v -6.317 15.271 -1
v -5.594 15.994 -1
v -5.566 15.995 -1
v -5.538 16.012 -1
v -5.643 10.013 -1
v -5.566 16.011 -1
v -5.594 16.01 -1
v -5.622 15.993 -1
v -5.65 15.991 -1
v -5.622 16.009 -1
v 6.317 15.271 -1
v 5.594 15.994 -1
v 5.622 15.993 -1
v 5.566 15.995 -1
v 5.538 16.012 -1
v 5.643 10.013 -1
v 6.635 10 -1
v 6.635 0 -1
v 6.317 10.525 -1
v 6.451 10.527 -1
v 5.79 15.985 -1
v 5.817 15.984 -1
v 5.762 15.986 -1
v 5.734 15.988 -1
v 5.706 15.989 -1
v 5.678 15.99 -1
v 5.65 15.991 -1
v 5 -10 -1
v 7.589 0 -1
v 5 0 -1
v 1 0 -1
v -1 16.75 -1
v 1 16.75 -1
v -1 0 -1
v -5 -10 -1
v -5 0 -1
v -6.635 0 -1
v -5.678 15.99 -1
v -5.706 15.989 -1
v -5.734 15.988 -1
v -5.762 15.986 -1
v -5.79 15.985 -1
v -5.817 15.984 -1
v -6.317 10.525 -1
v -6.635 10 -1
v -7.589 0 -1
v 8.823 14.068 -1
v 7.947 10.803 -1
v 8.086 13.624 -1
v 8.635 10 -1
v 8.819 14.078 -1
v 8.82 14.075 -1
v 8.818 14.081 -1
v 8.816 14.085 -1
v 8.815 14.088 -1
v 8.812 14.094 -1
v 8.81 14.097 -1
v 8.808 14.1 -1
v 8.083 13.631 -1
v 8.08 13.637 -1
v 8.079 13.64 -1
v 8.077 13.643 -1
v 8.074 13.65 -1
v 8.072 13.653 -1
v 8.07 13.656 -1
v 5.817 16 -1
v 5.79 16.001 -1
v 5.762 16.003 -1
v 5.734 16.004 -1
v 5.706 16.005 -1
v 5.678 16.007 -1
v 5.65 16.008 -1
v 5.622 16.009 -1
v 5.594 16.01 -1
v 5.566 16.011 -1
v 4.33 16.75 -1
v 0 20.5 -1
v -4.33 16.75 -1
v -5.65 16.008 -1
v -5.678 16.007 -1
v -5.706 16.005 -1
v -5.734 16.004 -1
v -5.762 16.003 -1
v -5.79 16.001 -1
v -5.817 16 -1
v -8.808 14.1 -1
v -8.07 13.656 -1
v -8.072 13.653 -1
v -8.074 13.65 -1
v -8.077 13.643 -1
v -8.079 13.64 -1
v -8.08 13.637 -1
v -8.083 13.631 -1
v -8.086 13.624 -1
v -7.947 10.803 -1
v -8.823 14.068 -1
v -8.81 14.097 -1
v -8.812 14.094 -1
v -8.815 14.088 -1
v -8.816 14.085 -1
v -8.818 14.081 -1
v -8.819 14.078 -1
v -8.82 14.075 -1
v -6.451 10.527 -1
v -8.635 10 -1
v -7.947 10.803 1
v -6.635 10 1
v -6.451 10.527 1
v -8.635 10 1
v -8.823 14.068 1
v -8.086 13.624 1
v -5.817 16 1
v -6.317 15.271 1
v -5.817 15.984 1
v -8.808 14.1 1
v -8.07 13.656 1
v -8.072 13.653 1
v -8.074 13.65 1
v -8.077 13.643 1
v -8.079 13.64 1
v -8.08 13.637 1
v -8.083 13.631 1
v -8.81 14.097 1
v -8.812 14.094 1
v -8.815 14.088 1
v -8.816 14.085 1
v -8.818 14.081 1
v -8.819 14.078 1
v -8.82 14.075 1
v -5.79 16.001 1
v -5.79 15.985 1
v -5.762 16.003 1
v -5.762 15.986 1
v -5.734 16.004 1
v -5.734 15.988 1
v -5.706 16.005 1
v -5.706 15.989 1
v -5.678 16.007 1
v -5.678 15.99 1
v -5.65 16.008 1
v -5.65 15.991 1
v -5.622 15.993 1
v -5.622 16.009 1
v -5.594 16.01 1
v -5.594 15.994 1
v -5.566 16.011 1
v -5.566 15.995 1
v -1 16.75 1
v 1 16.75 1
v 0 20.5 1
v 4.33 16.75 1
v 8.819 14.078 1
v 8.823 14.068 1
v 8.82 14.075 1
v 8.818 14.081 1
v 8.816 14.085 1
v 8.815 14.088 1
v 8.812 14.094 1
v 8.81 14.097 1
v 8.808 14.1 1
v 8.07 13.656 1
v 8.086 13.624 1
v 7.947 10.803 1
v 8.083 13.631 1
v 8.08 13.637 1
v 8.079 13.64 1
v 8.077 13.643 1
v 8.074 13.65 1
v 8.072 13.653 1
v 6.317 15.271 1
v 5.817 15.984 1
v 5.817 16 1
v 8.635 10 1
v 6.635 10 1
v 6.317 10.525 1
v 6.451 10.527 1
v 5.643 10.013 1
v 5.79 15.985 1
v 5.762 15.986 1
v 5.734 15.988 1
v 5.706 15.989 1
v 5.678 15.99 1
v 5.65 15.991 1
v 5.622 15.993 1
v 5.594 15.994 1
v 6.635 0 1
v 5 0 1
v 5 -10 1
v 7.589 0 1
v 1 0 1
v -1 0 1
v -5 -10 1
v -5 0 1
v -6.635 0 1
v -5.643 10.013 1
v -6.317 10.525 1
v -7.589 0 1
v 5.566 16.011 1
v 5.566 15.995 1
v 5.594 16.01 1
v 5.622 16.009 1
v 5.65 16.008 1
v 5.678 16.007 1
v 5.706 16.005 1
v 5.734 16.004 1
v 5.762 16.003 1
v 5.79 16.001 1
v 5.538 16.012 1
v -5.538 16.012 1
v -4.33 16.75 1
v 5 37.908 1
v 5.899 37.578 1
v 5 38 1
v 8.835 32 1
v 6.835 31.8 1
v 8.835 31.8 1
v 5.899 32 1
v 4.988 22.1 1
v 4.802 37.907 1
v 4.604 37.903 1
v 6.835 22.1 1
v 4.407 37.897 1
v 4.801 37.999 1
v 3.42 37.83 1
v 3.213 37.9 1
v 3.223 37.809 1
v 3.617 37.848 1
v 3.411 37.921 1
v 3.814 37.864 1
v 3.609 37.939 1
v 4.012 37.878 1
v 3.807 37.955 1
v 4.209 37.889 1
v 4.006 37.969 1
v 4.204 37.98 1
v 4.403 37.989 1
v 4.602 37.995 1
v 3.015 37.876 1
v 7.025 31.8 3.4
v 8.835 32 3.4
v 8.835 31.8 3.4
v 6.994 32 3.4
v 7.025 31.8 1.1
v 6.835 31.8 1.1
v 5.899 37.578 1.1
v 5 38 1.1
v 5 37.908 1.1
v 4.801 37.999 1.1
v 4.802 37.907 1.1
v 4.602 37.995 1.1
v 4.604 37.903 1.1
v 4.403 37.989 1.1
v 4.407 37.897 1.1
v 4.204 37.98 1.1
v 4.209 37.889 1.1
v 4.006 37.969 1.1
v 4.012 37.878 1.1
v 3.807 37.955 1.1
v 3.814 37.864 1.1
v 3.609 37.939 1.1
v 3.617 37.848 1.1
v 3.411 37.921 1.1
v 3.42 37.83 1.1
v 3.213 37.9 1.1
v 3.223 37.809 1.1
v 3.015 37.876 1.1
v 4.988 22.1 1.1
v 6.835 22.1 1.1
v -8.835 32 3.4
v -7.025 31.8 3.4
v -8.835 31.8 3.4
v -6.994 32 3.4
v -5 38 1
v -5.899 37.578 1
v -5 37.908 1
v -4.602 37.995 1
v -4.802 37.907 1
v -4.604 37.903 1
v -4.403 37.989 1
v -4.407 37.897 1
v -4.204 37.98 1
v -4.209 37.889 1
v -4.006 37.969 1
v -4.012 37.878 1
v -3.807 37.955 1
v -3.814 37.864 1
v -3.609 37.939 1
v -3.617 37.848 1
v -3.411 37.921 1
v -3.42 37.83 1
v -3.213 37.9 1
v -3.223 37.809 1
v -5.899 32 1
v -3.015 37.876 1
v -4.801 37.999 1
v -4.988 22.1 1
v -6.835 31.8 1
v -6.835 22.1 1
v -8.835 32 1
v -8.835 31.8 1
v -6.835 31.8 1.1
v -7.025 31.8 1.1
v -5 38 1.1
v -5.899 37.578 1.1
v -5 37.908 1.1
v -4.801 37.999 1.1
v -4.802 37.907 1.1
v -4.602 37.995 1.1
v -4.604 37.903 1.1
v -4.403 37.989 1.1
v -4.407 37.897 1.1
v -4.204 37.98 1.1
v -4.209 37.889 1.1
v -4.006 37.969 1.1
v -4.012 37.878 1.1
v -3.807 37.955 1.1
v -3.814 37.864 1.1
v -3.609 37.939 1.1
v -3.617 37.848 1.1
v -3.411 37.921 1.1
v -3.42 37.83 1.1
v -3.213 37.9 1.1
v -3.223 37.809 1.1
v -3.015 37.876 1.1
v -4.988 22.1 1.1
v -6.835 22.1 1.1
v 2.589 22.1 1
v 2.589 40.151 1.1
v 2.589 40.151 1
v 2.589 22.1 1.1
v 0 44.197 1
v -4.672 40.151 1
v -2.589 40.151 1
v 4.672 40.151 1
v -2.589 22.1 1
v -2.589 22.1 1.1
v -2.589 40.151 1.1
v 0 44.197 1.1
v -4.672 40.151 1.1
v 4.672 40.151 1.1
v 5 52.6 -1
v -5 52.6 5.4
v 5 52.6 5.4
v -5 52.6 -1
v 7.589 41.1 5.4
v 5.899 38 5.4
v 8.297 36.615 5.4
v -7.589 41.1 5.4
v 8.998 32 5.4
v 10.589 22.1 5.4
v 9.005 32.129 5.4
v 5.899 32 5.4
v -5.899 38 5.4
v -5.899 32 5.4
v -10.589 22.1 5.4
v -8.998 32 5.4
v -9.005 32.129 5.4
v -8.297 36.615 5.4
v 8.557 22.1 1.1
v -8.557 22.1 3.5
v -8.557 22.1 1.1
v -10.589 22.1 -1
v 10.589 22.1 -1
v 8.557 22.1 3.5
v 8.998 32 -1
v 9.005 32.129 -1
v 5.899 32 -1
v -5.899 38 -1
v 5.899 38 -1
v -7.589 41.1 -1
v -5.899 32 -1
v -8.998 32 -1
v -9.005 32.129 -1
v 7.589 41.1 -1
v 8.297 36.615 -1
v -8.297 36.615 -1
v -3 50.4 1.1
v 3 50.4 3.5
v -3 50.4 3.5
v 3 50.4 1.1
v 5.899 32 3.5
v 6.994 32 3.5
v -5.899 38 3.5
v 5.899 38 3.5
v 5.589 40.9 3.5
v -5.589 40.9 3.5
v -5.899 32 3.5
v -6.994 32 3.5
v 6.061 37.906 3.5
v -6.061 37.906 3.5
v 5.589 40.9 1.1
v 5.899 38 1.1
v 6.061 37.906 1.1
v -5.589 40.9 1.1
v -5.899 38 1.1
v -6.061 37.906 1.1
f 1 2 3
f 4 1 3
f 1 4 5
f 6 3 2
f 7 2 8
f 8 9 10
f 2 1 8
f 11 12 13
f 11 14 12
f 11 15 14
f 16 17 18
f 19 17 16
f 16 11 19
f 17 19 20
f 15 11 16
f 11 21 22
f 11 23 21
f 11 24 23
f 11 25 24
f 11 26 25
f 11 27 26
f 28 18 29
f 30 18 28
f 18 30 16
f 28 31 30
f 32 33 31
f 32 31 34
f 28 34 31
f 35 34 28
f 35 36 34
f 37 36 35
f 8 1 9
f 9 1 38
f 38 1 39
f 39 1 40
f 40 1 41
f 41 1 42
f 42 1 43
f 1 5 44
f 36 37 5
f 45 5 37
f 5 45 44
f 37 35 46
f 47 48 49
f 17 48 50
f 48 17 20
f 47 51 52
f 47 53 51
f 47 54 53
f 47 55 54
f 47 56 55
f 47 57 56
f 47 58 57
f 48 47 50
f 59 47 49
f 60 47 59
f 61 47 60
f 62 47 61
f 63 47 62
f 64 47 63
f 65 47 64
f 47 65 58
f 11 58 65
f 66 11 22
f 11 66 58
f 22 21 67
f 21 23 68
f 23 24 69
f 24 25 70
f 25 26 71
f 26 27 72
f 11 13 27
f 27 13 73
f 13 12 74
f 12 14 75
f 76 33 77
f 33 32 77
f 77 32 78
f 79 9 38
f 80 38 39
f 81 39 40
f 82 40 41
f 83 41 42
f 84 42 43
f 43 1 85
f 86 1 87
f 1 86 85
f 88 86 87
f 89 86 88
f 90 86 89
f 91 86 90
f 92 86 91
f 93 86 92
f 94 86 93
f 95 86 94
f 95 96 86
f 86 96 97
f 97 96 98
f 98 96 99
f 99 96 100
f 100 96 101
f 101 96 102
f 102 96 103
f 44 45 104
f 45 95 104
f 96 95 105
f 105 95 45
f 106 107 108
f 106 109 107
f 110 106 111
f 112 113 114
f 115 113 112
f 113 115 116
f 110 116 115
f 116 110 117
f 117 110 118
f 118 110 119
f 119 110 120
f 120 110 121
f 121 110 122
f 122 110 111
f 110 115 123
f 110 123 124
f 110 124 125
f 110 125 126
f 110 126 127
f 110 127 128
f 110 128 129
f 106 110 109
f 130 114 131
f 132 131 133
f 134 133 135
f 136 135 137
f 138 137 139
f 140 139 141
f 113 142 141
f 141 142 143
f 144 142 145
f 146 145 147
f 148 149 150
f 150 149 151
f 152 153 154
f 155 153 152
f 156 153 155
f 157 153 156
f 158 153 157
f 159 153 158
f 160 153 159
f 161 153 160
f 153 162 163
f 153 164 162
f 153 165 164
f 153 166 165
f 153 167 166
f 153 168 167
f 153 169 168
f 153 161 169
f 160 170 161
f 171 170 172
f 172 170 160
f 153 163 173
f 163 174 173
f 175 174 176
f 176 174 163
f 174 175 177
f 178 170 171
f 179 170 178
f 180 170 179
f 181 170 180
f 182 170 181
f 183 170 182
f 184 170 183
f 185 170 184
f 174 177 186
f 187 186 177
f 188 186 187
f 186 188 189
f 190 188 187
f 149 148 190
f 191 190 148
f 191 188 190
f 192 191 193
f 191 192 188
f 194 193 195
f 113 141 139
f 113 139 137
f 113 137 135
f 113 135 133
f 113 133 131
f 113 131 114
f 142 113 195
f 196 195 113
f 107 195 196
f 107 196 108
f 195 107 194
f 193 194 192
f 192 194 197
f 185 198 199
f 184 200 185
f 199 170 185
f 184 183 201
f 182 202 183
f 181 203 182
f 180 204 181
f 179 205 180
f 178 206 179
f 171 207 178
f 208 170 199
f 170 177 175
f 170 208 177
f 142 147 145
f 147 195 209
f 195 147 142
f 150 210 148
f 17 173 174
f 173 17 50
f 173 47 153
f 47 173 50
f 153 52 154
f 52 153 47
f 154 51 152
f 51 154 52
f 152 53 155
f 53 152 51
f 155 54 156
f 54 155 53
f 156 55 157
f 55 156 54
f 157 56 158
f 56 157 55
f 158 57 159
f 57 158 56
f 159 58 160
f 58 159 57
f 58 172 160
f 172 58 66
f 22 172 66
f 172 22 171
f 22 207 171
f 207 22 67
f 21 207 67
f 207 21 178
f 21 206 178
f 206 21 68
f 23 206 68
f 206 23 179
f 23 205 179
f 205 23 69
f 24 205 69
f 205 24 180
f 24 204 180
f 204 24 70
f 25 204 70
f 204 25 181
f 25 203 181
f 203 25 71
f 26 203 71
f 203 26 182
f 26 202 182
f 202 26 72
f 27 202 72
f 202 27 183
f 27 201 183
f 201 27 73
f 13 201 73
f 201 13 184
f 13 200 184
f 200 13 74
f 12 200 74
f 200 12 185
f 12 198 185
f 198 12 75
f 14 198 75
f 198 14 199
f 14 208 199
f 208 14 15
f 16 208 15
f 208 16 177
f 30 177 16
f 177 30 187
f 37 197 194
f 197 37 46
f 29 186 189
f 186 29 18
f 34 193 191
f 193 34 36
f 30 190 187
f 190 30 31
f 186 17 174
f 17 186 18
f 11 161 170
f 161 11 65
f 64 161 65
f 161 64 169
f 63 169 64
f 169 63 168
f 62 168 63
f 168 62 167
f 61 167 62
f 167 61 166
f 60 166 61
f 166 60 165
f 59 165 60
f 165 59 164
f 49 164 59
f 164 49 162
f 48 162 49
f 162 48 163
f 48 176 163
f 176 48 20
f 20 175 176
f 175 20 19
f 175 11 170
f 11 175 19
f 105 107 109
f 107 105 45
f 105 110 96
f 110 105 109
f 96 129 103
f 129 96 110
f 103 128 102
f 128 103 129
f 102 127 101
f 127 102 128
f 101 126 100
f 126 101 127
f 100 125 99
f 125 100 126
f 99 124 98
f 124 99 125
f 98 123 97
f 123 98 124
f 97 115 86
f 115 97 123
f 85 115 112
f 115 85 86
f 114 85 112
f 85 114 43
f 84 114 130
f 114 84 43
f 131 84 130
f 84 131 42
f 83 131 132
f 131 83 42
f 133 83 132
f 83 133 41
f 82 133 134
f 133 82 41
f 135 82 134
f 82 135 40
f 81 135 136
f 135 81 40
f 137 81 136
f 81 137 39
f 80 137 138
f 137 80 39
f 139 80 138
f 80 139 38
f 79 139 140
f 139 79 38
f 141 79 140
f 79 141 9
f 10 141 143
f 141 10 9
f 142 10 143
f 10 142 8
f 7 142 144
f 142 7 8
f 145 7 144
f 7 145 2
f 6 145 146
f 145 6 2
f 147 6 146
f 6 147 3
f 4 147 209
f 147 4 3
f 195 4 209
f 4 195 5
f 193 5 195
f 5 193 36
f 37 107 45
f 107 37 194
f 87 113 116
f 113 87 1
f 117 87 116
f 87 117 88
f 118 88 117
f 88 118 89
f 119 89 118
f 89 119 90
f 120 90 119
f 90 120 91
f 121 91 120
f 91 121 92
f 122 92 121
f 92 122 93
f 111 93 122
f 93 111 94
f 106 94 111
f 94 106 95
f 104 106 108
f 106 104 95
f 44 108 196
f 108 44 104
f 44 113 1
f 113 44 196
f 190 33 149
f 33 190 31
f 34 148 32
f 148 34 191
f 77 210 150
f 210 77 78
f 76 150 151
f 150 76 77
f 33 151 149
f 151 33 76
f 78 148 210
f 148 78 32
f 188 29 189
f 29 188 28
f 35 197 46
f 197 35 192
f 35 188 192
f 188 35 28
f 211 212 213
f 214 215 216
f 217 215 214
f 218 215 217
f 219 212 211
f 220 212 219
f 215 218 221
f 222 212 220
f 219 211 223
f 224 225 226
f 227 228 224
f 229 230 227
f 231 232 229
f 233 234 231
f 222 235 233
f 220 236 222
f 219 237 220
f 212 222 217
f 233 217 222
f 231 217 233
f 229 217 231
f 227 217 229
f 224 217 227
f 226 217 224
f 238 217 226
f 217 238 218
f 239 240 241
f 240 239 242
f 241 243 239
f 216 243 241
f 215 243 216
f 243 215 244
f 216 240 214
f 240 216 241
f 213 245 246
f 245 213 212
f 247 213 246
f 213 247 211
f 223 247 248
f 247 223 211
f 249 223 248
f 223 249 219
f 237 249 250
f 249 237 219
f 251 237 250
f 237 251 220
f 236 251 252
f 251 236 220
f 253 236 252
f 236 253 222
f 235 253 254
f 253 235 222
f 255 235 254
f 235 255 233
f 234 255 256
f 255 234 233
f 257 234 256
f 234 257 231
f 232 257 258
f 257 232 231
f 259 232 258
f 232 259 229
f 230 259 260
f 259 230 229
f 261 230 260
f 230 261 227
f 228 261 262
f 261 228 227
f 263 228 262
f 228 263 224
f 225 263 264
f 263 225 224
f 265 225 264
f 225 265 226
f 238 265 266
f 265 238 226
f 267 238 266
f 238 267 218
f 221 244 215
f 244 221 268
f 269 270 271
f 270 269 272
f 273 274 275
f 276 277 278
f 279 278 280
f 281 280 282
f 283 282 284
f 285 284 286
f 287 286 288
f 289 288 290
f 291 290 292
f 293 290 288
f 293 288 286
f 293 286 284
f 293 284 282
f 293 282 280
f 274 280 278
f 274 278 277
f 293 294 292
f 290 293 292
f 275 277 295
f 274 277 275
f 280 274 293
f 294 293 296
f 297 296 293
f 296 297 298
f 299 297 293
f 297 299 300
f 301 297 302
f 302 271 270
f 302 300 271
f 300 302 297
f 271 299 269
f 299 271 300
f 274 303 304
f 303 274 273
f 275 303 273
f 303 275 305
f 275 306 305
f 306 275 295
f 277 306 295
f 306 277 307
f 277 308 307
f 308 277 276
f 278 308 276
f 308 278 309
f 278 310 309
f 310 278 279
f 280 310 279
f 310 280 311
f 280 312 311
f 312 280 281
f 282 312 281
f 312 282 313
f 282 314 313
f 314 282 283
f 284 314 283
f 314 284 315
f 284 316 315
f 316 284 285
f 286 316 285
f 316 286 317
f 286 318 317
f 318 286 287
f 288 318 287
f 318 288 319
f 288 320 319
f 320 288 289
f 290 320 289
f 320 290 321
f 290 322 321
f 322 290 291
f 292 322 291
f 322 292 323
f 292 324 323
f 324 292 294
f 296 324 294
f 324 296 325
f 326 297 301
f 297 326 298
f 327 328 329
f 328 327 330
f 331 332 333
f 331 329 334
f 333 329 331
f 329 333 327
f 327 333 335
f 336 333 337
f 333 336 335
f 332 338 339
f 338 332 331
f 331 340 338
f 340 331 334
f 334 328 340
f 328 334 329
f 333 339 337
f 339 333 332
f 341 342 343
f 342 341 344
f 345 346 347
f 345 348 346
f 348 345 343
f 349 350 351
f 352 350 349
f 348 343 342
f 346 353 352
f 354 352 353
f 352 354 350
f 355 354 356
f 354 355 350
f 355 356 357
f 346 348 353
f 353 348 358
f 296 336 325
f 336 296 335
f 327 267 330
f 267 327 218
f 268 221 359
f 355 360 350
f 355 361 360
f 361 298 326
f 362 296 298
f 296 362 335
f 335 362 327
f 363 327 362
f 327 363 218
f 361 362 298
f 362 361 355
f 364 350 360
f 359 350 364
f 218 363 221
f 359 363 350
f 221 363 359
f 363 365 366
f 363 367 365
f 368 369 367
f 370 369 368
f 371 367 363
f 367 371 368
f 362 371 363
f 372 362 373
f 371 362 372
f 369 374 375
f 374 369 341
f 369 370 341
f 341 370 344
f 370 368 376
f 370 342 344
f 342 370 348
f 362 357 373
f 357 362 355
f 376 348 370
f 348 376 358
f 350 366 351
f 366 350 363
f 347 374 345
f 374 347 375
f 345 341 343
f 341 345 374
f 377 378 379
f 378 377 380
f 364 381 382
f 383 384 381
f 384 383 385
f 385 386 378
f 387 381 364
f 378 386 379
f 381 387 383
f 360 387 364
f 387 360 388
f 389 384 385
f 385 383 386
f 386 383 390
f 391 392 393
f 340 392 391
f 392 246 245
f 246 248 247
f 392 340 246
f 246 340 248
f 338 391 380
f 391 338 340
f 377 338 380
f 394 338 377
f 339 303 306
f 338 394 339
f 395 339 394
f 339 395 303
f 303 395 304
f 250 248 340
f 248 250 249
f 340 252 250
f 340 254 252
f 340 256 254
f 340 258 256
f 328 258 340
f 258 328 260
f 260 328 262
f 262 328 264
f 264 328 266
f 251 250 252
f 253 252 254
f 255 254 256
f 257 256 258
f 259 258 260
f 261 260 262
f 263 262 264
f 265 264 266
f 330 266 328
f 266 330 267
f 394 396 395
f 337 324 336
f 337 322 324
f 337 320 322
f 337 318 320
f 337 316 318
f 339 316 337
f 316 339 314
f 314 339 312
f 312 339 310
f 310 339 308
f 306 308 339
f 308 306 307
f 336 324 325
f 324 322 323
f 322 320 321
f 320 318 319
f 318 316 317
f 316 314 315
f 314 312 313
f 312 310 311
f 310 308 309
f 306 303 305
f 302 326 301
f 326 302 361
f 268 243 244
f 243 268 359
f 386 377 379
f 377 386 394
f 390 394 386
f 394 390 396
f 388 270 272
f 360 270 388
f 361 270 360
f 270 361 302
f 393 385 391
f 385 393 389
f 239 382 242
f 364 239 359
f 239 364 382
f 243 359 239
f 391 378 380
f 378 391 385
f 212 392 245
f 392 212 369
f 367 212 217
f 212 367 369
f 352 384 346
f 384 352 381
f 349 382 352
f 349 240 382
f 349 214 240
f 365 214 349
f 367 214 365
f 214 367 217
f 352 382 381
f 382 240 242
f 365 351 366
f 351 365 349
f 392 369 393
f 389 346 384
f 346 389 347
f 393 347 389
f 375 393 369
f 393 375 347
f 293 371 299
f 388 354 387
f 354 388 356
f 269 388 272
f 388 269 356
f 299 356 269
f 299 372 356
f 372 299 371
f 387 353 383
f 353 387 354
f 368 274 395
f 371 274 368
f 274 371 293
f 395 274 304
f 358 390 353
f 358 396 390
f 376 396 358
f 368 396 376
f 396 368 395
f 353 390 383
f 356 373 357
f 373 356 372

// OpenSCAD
taperratio = .8; //the reduced base thickness

//translate([30,0,0])taperSnapArm(length = 10, lzoom = 1, cantWidth = 4, headL = 6, cantAngle = -10,headHeight = 4, mask = 0, d = 2, res = 3);
//translate([60,0,0])taperSnapArm(length = 10, lzoom = 1, cantWidth = 4, headL = 6, cantAngle = -10,headHeight = 4, mask = 0.2, d = 2);
translate([0,0,0])beltSideSnap(length = 10, lzoom = 1, cantWidth = 2, headL = 6, cantAngle = 0,headHeight = 4, mask = 0.0, d = 2,width = 10);
translate([0,22,0])beltSideSnap(length = 10, lzoom = 1, cantWidth = 2, headL = 6, cantAngle = 0,headHeight = 4, mask = 0.2, d = 2,width = 10);

//translate([-30,0,0])doubleCantilever(baseThick = 2, headThick = 3, cantL = 4, headL = 2, ratio = taperratio, mask = 0.0);
/*
   taken  from cantilver snap joints:
http://fab.cba.mit.edu/classes/S62.12/people/vernelle.noel/Plastic_Snap_fit_design.pdf
y= (permissible) deflection (=undercut)
E= (permissible) strain in the outer fiber at the root; 
1= length of arm
h= thickness at root 
b= width at root
c= distance between outer fiber and neutral fiber (center of gravity)
Z= section modulus Z = I c, where I = axial moment of inertia
Es= secant modulus (see Fig. 16) 
P= (permissible) deflection force
K= geometric factor (see Fig. 10
 */

//eps=0.5*20/100;//Elongation at break of PLA=6%
eps=0.5*6/100;//Elongation at break of PLA=6%
//straight cantilever Arm
function hForFixedArm(y,l, eps = eps)=0.67*eps*l*l*y;
function hForTaperArm(y,l, eps = eps)=1.09*eps*l*l/y;//means h at the end of the arm is .5 h from the start
function hForTaperXArm(y,l, eps = eps)=0.86*eps*l*l/y;//d goes from d to d/2
function maxFlexArm(b,h,E,l, eps = eps)= b*h*h/6*E*eps/l;
//trapezoidal cantilever arm
function hForFixedTrapez(a,b,y,l, eps = eps)=(a+b)/(2a+b)*eps*l*l/y;
function hForTaperTrapez(a,b,y,l, eps = eps)=1.64*(a+b)/(2a+b)*eps*l*l/y;
function hForTaperXTrapez(a,b,y,l, eps = eps)=1.28*(a+b)/(2a+b)*eps*l*l/y;
function maxFlexTrapez(b,h,E,l, eps = eps)= h*h*(a*a+4*a*b+b*b)*E*eps/(12*(2*a+b)*l);
//ring segment arm, K goes in dependence of theta from around 1 to 10
function yForFixedSeg(r,l,K=2, eps = eps)=K*eps*l*l/r;
function yForTaperSeg(r,l,K=2, eps = eps)=1.64*K*eps*l*l/r;
function yForTaperXSeg(r,l,K=2, eps = eps)=1.28*K*eps*l*l/r;
function maxFlexSeg(Z,E,l, eps = eps)= Z*E*eps/l;
//anyshape arm result is c meaning middle height depending of mass distribution usually h/2
function hForFixedIrreg(y,l, eps = eps)=1/3*eps*l*l/y;
function hForTaperIrreg(y,l, eps = eps)=0.55*eps*l*l/y;
function hForTaperXIrreg(y,l, eps = eps)=0.43*eps*l*l/y;
function maxFlexSeg(Z,E,l, eps = eps)= Z*E*eps/l;

/**
  taperArmPoly (l  arm length (without head)
  y  snap tooth width, 
  arm zoom (to make arm thicker, default  1 (no zoom), don't make it smaller, it will snap...
  angle of the head, to make snap permanent or easier reversible
  button  head height, to make ev a push button, 
  head total head heigth
  mask = value, >0 creates a mask forthe snap fit to be diffed with something, value added to shape
  eps material constant 2% usually, some say 6% for PLA, use 50% of snap force, so 3% should be safe 
  (default val)
 */
function cantCheckButton(b,h) = (b < 0)? 0  : (b > h)?h:b; 
  function taperArmPoly(l, y, lz = 1, angle, button  =0, head, mask = 0, eps =eps, smooth =0) = 
  let( h = lz*hForTaperArm(y,l, eps = eps))
let( hh = cantCheckButton(button,head))

  [ 
    (mask >  0)?[0,0]                :[0,0],
    (mask >  0)?[h+mask,0]          :[h,0],
    (mask >  0)?[h+mask,l-mask]:[h,l],
    (mask >  0)?[h+y+mask,l*(1+sin(angle))-mask]  :[h+y,l*(1+sin(angle))],
  if(mask >  0) [h+y+mask,l+hh+mask]    
else if(smooth >0) each(roundPoint2D([h+y,l+hh],rad=y/10, res = 1*smooth,a0 = 20, a1 = 30, left = false)) 
  else [h+y,l+hh],
  //(mask >  0)?[h+y+mask,l+hh+mask]    :(smooth >0)? each(roundPoint2D([h+y,l+hh],rad=30, res = smooth,above = true, left = false)):[h+y,l+hh],
  (mask >  0)?[0,l+head]     :[h/2,l+head],
  (mask >  0)?[0,l+head]     :[h/2,l],
  ];
  function taperArmHeadPoly(l, y, lz = 1, angle, button  =0, head,  eps =eps, smooth =0, mask = 0) = 
  let( h = lz*hForTaperArm(y,l, eps = eps))
  let( hh = cantCheckButton(button,head))
  let( d = (mask == 0)?min(head/4, y/4): 0)
  [ 
    [h,l+d],
    [h+y-d,(l)*(1+sin(angle))+1.5*d],
    if(smooth >0) each(roundPoint2D([h+y-d,l+hh-d],rad=y/10, res = 1*smooth,a0 = 20, a1 = 30, left = false)) 
  else [h+y-d,l+hh-d],
  [h/2+d,l+head-d],
  [h/2+d,l+d+1.5*d*tan(angle)],//ehm bad at geometry.. why 1.5 *??
  ];
function flatArray(a)= [
  if(len(a) > 2) each(a) else a];
/**
 beltSideSnap
 build a belt snapfit where the cantilevers are on the side, pinch the beltbucle to release it
 
 set mask >0 to build the bucle, = 0 the insert
*/
module beltSideSnap(length = 10, lzoom = 1, cantWidth = 4, headL = 6, cantAngle = -10,headHeight = 4, mask = 0, d = 2, res = 30, width = 10)
{
  h = lzoom*hForTaperArm(cantWidth,headL, eps = eps);
  if(mask == 0)
  {
    doubleTaperSnapArm(length, lzoom, cantWidth, headL, cantAngle,headHeight, mask, d,width);
    polydata = [
      [-width/2-h-cantWidth,0],
      [width/2+h+cantWidth,0],
      [width/2,-width],
      [-width/2,-width],
    ];
      translate([0,0,-d/2])
        linear_extrude(height = d)polygon(polydata);
      translate([0,1.5*headL,0])
      {
        cube([d,length+1.5*headL,d], center = true); 
        translate([0,1.5*headL,-d/2])
          color("red") scale([1,.5,1])rotate([0,0,-30])cylinder(d = width, h= d, $fn=3);
      }
  }
  else
  {
  //exth = (mask >0)? d+2*mask : d; 
  //endangle = (mask >0)?90-atan((length+headL)/cantWidth): 1;

    polydata = [
      [-width/2,length+1.75*headL+width],
      [width/2 ,length+1.75*headL+width],
      [width/2+h+cantWidth ,length+1.5*headL],
      [width/2+h+1.5*cantWidth+d ,0],
      [-width/2-h-1.5*cantWidth-d,0],
      [-width/2-h-cantWidth,length+1.5*headL],
    ];
    insidedata = [
      [-width/2+d,length+1.75*headL+width-d],
      [width/2-d ,length+1.75*headL+width-d],
      [width/2+h+cantWidth-d ,length+1.5*headL],
      [width/2+h+1.5*cantWidth ,0],
      [-width/2-h-1.5*cantWidth,0],
      [-width/2-h-cantWidth+d,length+1.5*headL],
    ];
difference()
{
      translate([0,0,d+mask])
        difference()
        {
          translate([0,0.1,-(3*d+2*mask)/2])
            linear_extrude(height = 3*d+2*mask)polygon(polydata);
          //for(y = [0: -length/headL : -length-1.75*headL])
          //translate([0,y,0])
          union()
          {
            doubleTaperSnapArm(length, lzoom, cantWidth, headL, cantAngle,headHeight, mask, d,width);
            translate([0,1.5*headL,0])
            {
              cube([2*(cantWidth+h),length+1.5*headL,d+2*mask], center = true); 
              translate([0,1.75*headL,-(d+2*mask)/2])
                 scale([1,.5,1])rotate([0,0,-30])cylinder(d = width+h+mask,h = d+2*mask, $fn=3);
            }
            //translate([width,length+width/4,-2*d]) color("red")cylinder(d=2*cantWidth, h=10*d, $fn =32);
            //translate([-width,length+width/4,-2*d]) color("red")cylinder(d=2*cantWidth, h=10*d, $fn =32);
          }
        }
union()
{
  headdata = taperArmHeadPoly(l=length, y=cantWidth, lz = lzoom, angle=cantAngle, button  =headHeight, head=headL, mask = 5*mask, eps =eps, smooth = res);
color("blue")
          translate([0,-0.1,(d+mask)/2])
            linear_extrude(height = d+2*mask)polygon(insidedata);
color("green")
          translate([width/2,0,-(d+mask)/2])
            scale([1.1,1,1])
            linear_extrude(height = 4*d+2*mask)polygon(headdata);
          translate([-width/2,0,-(d+mask)/2])mirror([1,0,0])
            scale([1.1,1,1])linear_extrude(height = 4*d+2*mask)polygon(headdata);
}
}
  }
}

/**
 build a tapered snap cantilever arm, with mask >0 build the corresponding mask
*/
module taperSnapArm(length = 10, lzoom = 1, cantWidth = 4, headL = 6, cantAngle = -10,headHeight = 4, mask = 0, d = 2, res = 30)
{
  exth = (mask >0)? d+2*mask : d; 
  endangle = (mask >0)?90-atan((length+headL)/cantWidth): 1;
  h = lzoom*hForTaperArm(cantWidth,length, eps = eps);
  data = taperArmPoly(l=length, y=cantWidth, lz = lzoom, angle=cantAngle, button  =headHeight, head=headL, mask = mask, eps =eps, smooth = res);
  echo("alpha = ",endangle, " res  = ",res,"  data = ",data);
  headdata = taperArmHeadPoly(l=length, y=cantWidth, lz = lzoom, angle=cantAngle, button  =headHeight, head=headL, eps =eps, smooth = res);
  translate([cantWidth,0,-exth/2])
    linear_extrude(height = exth)
    {

      for(alpha = [0:endangle/res: endangle]) rotate([0,0,alpha])
      {
if(mask ==0)
        difference()
        {
          polygon( data );
          polygon( headdata );
        }
else polygon(data);
      }

    }
}// module cantilever(baseThick = 2, headThick = 3, cantL = 4, headL = 2, ratio = taperratio, mask = 0)

/**
 same  as tapered snap cantilever arm, only mirrored, preparation for belt bucle
  with mask >0 build the corresponding mask
*/
module doubleTaperSnapArm(length = 10, lzoom = 1, cantWidth = 4, headL = 6, cantAngle = -10,headHeight = 4, mask = 0, d = 2, res = 30, width = 10)
{
  disp = (width/2 >cantWidth)? width/2-cantWidth : 1.01*cantWidth;
  translate([disp,0,0])
    taperSnapArm(length, lzoom , cantWidth, headL, cantAngle,headHeight, mask, d, res);
  translate([-disp,0,0])rotate([0,180,0])
    taperSnapArm(length, lzoom , cantWidth, headL, cantAngle,headHeight, mask, d, res);
}


function cantCheckX(x0,x1,tp,minArm = 0.9) = (x1-x0 < minArm*x0*tp)? x1-x0  : minArm*x0*tp; 
function cantileverPoly(x0, x1, y0, y1, tap, mask = 0, minArm = .9) = [ 
  (mask >  0)?[0,0]                :[cantCheckX(x0,x1,tap, minArm),0],
  (mask >  0)?[x0+mask,0]          :[x0,0],
  (mask >  0)?[x0+2*mask,y0-2*mask]:[x0*tap,y0],
  (mask >  0)?[x1+mask,y0-2*mask]  :[x1,y0],
  (mask >  0)?[x1+mask,y0+mask]    :[x1,y0],
  (mask >  0)?[0,y1+y0+2*mask]     :[cantCheckX(x0,x1,tap, minArm),y1+y0]
];


module doubleCantilever(baseThick = 2, headThick = 3, cantL = 4, headL = 2, ratio = taperratio, mask = 0, d = 2, minArmRatio = .9)
{
  linear_extrude(height = d)
  {
    polygon(cantileverPoly(baseThick,headThick,cantL,headL,taperratio,mask,minArmRatio));
    mirror([1,0,0]) polygon(cantileverPoly(baseThick,headThick,cantL,headL,taperratio,mask,minArmRatio));
  }

}// module doubleCantilever(baseThick = 2, headThick = 3, cantL = 4, headL = 2, ratio = taperratio, mask = 0)

module cantilever(baseThick = 2, headThick = 3, cantL = 4, headL = 2, ratio = taperratio, mask = 0, d = 2,minArmRatio = 0.9)
{
  linear_extrude(height = d)
  {
    polygon(cantileverPoly(baseThick,headThick,cantL,headL,taperratio,mask,minArmRatio));
  }
}// module cantilever(baseThick = 2, headThick = 3, cantL = 4, headL = 2, ratio = taperratio, mask = 0)

function roundPoint2D(pt,rad, res = 3,left = false,a0 = 0, a1 = 180) = 
  [
  let (dw = a1-a0) 
  for(n = [((left)? res:0):((left)? -1:1):((left)? 0:res)]) 
let (w = dw/res*n) 
  [pt[0]+rad*cos(a0+w), pt[1]+rad*sin(a0+w)]    
  ]; 
